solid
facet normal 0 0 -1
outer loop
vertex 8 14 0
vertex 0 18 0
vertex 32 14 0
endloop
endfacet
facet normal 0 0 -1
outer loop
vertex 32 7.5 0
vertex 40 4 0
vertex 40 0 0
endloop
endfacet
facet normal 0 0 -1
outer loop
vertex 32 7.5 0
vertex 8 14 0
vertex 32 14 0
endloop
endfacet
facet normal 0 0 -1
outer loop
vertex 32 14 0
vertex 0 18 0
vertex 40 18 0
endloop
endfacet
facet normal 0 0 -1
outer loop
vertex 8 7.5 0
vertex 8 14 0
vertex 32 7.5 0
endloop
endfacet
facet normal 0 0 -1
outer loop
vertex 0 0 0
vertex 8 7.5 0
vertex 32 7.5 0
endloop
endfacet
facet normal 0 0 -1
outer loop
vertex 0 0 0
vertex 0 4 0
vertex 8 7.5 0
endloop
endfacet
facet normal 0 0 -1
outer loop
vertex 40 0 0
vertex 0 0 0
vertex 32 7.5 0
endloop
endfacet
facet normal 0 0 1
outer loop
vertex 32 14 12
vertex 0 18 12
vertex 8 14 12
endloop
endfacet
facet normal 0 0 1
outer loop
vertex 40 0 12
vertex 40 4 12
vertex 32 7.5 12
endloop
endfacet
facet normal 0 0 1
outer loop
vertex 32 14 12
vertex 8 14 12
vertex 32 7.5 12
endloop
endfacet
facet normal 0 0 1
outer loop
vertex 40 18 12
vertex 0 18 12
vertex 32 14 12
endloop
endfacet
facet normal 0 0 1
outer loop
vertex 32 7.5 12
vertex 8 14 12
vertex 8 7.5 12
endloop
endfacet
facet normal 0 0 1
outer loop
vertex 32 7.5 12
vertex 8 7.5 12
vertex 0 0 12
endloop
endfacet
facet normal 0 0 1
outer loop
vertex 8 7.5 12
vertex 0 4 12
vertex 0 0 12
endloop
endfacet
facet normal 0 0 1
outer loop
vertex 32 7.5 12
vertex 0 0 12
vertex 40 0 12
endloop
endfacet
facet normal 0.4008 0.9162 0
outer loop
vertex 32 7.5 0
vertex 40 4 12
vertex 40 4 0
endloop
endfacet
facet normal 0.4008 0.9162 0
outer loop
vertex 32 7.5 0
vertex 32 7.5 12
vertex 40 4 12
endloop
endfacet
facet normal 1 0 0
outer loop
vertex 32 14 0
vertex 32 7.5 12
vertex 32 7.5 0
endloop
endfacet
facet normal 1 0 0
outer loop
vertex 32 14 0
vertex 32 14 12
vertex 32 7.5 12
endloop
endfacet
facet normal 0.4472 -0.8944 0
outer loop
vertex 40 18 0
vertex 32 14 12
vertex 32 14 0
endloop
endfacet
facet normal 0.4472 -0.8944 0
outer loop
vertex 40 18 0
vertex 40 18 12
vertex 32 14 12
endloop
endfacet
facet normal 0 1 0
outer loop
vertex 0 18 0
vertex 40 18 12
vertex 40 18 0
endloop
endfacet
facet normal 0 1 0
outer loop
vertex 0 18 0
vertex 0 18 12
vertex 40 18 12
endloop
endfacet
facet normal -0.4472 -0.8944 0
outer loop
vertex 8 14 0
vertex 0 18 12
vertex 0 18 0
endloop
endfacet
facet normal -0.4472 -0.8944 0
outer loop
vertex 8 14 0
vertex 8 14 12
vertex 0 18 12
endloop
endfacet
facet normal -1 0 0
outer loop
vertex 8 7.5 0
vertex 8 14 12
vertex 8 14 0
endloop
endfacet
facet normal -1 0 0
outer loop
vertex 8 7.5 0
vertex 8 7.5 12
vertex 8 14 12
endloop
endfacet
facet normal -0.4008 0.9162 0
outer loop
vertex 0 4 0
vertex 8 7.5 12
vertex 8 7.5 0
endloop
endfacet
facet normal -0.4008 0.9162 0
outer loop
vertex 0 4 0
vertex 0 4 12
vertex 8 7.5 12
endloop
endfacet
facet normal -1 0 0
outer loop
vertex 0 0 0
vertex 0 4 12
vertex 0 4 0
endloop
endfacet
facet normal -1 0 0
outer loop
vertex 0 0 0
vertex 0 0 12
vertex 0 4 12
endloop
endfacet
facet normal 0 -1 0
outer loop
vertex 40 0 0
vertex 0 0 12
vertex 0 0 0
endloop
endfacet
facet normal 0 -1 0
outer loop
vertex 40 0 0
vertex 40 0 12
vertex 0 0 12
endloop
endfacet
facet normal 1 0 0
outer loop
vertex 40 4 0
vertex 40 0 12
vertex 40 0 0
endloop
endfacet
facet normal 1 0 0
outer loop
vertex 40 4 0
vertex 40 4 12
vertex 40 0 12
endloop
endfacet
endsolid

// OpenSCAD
$fn = 32;

// ----------------------------------------------------------------------
// Key bar: dovetail key, 12 mm thick
// ----------------------------------------------------------------------

// --- parameters (mm) ---
profile_height = 12;      // extrusion height
profile_points = 10;      // points of the closed outline

profile = [[0, 0], [40, 0], [40, 4], [32, 7.5], [32, 14], [40, 18], [0, 18], [8, 14], [8, 7.5], [0, 4]];  // single closed polygon, 10 points, counter clockwise

// --- the one profile operation ---
linear_extrude(height = profile_height) polygon(points = profile);
